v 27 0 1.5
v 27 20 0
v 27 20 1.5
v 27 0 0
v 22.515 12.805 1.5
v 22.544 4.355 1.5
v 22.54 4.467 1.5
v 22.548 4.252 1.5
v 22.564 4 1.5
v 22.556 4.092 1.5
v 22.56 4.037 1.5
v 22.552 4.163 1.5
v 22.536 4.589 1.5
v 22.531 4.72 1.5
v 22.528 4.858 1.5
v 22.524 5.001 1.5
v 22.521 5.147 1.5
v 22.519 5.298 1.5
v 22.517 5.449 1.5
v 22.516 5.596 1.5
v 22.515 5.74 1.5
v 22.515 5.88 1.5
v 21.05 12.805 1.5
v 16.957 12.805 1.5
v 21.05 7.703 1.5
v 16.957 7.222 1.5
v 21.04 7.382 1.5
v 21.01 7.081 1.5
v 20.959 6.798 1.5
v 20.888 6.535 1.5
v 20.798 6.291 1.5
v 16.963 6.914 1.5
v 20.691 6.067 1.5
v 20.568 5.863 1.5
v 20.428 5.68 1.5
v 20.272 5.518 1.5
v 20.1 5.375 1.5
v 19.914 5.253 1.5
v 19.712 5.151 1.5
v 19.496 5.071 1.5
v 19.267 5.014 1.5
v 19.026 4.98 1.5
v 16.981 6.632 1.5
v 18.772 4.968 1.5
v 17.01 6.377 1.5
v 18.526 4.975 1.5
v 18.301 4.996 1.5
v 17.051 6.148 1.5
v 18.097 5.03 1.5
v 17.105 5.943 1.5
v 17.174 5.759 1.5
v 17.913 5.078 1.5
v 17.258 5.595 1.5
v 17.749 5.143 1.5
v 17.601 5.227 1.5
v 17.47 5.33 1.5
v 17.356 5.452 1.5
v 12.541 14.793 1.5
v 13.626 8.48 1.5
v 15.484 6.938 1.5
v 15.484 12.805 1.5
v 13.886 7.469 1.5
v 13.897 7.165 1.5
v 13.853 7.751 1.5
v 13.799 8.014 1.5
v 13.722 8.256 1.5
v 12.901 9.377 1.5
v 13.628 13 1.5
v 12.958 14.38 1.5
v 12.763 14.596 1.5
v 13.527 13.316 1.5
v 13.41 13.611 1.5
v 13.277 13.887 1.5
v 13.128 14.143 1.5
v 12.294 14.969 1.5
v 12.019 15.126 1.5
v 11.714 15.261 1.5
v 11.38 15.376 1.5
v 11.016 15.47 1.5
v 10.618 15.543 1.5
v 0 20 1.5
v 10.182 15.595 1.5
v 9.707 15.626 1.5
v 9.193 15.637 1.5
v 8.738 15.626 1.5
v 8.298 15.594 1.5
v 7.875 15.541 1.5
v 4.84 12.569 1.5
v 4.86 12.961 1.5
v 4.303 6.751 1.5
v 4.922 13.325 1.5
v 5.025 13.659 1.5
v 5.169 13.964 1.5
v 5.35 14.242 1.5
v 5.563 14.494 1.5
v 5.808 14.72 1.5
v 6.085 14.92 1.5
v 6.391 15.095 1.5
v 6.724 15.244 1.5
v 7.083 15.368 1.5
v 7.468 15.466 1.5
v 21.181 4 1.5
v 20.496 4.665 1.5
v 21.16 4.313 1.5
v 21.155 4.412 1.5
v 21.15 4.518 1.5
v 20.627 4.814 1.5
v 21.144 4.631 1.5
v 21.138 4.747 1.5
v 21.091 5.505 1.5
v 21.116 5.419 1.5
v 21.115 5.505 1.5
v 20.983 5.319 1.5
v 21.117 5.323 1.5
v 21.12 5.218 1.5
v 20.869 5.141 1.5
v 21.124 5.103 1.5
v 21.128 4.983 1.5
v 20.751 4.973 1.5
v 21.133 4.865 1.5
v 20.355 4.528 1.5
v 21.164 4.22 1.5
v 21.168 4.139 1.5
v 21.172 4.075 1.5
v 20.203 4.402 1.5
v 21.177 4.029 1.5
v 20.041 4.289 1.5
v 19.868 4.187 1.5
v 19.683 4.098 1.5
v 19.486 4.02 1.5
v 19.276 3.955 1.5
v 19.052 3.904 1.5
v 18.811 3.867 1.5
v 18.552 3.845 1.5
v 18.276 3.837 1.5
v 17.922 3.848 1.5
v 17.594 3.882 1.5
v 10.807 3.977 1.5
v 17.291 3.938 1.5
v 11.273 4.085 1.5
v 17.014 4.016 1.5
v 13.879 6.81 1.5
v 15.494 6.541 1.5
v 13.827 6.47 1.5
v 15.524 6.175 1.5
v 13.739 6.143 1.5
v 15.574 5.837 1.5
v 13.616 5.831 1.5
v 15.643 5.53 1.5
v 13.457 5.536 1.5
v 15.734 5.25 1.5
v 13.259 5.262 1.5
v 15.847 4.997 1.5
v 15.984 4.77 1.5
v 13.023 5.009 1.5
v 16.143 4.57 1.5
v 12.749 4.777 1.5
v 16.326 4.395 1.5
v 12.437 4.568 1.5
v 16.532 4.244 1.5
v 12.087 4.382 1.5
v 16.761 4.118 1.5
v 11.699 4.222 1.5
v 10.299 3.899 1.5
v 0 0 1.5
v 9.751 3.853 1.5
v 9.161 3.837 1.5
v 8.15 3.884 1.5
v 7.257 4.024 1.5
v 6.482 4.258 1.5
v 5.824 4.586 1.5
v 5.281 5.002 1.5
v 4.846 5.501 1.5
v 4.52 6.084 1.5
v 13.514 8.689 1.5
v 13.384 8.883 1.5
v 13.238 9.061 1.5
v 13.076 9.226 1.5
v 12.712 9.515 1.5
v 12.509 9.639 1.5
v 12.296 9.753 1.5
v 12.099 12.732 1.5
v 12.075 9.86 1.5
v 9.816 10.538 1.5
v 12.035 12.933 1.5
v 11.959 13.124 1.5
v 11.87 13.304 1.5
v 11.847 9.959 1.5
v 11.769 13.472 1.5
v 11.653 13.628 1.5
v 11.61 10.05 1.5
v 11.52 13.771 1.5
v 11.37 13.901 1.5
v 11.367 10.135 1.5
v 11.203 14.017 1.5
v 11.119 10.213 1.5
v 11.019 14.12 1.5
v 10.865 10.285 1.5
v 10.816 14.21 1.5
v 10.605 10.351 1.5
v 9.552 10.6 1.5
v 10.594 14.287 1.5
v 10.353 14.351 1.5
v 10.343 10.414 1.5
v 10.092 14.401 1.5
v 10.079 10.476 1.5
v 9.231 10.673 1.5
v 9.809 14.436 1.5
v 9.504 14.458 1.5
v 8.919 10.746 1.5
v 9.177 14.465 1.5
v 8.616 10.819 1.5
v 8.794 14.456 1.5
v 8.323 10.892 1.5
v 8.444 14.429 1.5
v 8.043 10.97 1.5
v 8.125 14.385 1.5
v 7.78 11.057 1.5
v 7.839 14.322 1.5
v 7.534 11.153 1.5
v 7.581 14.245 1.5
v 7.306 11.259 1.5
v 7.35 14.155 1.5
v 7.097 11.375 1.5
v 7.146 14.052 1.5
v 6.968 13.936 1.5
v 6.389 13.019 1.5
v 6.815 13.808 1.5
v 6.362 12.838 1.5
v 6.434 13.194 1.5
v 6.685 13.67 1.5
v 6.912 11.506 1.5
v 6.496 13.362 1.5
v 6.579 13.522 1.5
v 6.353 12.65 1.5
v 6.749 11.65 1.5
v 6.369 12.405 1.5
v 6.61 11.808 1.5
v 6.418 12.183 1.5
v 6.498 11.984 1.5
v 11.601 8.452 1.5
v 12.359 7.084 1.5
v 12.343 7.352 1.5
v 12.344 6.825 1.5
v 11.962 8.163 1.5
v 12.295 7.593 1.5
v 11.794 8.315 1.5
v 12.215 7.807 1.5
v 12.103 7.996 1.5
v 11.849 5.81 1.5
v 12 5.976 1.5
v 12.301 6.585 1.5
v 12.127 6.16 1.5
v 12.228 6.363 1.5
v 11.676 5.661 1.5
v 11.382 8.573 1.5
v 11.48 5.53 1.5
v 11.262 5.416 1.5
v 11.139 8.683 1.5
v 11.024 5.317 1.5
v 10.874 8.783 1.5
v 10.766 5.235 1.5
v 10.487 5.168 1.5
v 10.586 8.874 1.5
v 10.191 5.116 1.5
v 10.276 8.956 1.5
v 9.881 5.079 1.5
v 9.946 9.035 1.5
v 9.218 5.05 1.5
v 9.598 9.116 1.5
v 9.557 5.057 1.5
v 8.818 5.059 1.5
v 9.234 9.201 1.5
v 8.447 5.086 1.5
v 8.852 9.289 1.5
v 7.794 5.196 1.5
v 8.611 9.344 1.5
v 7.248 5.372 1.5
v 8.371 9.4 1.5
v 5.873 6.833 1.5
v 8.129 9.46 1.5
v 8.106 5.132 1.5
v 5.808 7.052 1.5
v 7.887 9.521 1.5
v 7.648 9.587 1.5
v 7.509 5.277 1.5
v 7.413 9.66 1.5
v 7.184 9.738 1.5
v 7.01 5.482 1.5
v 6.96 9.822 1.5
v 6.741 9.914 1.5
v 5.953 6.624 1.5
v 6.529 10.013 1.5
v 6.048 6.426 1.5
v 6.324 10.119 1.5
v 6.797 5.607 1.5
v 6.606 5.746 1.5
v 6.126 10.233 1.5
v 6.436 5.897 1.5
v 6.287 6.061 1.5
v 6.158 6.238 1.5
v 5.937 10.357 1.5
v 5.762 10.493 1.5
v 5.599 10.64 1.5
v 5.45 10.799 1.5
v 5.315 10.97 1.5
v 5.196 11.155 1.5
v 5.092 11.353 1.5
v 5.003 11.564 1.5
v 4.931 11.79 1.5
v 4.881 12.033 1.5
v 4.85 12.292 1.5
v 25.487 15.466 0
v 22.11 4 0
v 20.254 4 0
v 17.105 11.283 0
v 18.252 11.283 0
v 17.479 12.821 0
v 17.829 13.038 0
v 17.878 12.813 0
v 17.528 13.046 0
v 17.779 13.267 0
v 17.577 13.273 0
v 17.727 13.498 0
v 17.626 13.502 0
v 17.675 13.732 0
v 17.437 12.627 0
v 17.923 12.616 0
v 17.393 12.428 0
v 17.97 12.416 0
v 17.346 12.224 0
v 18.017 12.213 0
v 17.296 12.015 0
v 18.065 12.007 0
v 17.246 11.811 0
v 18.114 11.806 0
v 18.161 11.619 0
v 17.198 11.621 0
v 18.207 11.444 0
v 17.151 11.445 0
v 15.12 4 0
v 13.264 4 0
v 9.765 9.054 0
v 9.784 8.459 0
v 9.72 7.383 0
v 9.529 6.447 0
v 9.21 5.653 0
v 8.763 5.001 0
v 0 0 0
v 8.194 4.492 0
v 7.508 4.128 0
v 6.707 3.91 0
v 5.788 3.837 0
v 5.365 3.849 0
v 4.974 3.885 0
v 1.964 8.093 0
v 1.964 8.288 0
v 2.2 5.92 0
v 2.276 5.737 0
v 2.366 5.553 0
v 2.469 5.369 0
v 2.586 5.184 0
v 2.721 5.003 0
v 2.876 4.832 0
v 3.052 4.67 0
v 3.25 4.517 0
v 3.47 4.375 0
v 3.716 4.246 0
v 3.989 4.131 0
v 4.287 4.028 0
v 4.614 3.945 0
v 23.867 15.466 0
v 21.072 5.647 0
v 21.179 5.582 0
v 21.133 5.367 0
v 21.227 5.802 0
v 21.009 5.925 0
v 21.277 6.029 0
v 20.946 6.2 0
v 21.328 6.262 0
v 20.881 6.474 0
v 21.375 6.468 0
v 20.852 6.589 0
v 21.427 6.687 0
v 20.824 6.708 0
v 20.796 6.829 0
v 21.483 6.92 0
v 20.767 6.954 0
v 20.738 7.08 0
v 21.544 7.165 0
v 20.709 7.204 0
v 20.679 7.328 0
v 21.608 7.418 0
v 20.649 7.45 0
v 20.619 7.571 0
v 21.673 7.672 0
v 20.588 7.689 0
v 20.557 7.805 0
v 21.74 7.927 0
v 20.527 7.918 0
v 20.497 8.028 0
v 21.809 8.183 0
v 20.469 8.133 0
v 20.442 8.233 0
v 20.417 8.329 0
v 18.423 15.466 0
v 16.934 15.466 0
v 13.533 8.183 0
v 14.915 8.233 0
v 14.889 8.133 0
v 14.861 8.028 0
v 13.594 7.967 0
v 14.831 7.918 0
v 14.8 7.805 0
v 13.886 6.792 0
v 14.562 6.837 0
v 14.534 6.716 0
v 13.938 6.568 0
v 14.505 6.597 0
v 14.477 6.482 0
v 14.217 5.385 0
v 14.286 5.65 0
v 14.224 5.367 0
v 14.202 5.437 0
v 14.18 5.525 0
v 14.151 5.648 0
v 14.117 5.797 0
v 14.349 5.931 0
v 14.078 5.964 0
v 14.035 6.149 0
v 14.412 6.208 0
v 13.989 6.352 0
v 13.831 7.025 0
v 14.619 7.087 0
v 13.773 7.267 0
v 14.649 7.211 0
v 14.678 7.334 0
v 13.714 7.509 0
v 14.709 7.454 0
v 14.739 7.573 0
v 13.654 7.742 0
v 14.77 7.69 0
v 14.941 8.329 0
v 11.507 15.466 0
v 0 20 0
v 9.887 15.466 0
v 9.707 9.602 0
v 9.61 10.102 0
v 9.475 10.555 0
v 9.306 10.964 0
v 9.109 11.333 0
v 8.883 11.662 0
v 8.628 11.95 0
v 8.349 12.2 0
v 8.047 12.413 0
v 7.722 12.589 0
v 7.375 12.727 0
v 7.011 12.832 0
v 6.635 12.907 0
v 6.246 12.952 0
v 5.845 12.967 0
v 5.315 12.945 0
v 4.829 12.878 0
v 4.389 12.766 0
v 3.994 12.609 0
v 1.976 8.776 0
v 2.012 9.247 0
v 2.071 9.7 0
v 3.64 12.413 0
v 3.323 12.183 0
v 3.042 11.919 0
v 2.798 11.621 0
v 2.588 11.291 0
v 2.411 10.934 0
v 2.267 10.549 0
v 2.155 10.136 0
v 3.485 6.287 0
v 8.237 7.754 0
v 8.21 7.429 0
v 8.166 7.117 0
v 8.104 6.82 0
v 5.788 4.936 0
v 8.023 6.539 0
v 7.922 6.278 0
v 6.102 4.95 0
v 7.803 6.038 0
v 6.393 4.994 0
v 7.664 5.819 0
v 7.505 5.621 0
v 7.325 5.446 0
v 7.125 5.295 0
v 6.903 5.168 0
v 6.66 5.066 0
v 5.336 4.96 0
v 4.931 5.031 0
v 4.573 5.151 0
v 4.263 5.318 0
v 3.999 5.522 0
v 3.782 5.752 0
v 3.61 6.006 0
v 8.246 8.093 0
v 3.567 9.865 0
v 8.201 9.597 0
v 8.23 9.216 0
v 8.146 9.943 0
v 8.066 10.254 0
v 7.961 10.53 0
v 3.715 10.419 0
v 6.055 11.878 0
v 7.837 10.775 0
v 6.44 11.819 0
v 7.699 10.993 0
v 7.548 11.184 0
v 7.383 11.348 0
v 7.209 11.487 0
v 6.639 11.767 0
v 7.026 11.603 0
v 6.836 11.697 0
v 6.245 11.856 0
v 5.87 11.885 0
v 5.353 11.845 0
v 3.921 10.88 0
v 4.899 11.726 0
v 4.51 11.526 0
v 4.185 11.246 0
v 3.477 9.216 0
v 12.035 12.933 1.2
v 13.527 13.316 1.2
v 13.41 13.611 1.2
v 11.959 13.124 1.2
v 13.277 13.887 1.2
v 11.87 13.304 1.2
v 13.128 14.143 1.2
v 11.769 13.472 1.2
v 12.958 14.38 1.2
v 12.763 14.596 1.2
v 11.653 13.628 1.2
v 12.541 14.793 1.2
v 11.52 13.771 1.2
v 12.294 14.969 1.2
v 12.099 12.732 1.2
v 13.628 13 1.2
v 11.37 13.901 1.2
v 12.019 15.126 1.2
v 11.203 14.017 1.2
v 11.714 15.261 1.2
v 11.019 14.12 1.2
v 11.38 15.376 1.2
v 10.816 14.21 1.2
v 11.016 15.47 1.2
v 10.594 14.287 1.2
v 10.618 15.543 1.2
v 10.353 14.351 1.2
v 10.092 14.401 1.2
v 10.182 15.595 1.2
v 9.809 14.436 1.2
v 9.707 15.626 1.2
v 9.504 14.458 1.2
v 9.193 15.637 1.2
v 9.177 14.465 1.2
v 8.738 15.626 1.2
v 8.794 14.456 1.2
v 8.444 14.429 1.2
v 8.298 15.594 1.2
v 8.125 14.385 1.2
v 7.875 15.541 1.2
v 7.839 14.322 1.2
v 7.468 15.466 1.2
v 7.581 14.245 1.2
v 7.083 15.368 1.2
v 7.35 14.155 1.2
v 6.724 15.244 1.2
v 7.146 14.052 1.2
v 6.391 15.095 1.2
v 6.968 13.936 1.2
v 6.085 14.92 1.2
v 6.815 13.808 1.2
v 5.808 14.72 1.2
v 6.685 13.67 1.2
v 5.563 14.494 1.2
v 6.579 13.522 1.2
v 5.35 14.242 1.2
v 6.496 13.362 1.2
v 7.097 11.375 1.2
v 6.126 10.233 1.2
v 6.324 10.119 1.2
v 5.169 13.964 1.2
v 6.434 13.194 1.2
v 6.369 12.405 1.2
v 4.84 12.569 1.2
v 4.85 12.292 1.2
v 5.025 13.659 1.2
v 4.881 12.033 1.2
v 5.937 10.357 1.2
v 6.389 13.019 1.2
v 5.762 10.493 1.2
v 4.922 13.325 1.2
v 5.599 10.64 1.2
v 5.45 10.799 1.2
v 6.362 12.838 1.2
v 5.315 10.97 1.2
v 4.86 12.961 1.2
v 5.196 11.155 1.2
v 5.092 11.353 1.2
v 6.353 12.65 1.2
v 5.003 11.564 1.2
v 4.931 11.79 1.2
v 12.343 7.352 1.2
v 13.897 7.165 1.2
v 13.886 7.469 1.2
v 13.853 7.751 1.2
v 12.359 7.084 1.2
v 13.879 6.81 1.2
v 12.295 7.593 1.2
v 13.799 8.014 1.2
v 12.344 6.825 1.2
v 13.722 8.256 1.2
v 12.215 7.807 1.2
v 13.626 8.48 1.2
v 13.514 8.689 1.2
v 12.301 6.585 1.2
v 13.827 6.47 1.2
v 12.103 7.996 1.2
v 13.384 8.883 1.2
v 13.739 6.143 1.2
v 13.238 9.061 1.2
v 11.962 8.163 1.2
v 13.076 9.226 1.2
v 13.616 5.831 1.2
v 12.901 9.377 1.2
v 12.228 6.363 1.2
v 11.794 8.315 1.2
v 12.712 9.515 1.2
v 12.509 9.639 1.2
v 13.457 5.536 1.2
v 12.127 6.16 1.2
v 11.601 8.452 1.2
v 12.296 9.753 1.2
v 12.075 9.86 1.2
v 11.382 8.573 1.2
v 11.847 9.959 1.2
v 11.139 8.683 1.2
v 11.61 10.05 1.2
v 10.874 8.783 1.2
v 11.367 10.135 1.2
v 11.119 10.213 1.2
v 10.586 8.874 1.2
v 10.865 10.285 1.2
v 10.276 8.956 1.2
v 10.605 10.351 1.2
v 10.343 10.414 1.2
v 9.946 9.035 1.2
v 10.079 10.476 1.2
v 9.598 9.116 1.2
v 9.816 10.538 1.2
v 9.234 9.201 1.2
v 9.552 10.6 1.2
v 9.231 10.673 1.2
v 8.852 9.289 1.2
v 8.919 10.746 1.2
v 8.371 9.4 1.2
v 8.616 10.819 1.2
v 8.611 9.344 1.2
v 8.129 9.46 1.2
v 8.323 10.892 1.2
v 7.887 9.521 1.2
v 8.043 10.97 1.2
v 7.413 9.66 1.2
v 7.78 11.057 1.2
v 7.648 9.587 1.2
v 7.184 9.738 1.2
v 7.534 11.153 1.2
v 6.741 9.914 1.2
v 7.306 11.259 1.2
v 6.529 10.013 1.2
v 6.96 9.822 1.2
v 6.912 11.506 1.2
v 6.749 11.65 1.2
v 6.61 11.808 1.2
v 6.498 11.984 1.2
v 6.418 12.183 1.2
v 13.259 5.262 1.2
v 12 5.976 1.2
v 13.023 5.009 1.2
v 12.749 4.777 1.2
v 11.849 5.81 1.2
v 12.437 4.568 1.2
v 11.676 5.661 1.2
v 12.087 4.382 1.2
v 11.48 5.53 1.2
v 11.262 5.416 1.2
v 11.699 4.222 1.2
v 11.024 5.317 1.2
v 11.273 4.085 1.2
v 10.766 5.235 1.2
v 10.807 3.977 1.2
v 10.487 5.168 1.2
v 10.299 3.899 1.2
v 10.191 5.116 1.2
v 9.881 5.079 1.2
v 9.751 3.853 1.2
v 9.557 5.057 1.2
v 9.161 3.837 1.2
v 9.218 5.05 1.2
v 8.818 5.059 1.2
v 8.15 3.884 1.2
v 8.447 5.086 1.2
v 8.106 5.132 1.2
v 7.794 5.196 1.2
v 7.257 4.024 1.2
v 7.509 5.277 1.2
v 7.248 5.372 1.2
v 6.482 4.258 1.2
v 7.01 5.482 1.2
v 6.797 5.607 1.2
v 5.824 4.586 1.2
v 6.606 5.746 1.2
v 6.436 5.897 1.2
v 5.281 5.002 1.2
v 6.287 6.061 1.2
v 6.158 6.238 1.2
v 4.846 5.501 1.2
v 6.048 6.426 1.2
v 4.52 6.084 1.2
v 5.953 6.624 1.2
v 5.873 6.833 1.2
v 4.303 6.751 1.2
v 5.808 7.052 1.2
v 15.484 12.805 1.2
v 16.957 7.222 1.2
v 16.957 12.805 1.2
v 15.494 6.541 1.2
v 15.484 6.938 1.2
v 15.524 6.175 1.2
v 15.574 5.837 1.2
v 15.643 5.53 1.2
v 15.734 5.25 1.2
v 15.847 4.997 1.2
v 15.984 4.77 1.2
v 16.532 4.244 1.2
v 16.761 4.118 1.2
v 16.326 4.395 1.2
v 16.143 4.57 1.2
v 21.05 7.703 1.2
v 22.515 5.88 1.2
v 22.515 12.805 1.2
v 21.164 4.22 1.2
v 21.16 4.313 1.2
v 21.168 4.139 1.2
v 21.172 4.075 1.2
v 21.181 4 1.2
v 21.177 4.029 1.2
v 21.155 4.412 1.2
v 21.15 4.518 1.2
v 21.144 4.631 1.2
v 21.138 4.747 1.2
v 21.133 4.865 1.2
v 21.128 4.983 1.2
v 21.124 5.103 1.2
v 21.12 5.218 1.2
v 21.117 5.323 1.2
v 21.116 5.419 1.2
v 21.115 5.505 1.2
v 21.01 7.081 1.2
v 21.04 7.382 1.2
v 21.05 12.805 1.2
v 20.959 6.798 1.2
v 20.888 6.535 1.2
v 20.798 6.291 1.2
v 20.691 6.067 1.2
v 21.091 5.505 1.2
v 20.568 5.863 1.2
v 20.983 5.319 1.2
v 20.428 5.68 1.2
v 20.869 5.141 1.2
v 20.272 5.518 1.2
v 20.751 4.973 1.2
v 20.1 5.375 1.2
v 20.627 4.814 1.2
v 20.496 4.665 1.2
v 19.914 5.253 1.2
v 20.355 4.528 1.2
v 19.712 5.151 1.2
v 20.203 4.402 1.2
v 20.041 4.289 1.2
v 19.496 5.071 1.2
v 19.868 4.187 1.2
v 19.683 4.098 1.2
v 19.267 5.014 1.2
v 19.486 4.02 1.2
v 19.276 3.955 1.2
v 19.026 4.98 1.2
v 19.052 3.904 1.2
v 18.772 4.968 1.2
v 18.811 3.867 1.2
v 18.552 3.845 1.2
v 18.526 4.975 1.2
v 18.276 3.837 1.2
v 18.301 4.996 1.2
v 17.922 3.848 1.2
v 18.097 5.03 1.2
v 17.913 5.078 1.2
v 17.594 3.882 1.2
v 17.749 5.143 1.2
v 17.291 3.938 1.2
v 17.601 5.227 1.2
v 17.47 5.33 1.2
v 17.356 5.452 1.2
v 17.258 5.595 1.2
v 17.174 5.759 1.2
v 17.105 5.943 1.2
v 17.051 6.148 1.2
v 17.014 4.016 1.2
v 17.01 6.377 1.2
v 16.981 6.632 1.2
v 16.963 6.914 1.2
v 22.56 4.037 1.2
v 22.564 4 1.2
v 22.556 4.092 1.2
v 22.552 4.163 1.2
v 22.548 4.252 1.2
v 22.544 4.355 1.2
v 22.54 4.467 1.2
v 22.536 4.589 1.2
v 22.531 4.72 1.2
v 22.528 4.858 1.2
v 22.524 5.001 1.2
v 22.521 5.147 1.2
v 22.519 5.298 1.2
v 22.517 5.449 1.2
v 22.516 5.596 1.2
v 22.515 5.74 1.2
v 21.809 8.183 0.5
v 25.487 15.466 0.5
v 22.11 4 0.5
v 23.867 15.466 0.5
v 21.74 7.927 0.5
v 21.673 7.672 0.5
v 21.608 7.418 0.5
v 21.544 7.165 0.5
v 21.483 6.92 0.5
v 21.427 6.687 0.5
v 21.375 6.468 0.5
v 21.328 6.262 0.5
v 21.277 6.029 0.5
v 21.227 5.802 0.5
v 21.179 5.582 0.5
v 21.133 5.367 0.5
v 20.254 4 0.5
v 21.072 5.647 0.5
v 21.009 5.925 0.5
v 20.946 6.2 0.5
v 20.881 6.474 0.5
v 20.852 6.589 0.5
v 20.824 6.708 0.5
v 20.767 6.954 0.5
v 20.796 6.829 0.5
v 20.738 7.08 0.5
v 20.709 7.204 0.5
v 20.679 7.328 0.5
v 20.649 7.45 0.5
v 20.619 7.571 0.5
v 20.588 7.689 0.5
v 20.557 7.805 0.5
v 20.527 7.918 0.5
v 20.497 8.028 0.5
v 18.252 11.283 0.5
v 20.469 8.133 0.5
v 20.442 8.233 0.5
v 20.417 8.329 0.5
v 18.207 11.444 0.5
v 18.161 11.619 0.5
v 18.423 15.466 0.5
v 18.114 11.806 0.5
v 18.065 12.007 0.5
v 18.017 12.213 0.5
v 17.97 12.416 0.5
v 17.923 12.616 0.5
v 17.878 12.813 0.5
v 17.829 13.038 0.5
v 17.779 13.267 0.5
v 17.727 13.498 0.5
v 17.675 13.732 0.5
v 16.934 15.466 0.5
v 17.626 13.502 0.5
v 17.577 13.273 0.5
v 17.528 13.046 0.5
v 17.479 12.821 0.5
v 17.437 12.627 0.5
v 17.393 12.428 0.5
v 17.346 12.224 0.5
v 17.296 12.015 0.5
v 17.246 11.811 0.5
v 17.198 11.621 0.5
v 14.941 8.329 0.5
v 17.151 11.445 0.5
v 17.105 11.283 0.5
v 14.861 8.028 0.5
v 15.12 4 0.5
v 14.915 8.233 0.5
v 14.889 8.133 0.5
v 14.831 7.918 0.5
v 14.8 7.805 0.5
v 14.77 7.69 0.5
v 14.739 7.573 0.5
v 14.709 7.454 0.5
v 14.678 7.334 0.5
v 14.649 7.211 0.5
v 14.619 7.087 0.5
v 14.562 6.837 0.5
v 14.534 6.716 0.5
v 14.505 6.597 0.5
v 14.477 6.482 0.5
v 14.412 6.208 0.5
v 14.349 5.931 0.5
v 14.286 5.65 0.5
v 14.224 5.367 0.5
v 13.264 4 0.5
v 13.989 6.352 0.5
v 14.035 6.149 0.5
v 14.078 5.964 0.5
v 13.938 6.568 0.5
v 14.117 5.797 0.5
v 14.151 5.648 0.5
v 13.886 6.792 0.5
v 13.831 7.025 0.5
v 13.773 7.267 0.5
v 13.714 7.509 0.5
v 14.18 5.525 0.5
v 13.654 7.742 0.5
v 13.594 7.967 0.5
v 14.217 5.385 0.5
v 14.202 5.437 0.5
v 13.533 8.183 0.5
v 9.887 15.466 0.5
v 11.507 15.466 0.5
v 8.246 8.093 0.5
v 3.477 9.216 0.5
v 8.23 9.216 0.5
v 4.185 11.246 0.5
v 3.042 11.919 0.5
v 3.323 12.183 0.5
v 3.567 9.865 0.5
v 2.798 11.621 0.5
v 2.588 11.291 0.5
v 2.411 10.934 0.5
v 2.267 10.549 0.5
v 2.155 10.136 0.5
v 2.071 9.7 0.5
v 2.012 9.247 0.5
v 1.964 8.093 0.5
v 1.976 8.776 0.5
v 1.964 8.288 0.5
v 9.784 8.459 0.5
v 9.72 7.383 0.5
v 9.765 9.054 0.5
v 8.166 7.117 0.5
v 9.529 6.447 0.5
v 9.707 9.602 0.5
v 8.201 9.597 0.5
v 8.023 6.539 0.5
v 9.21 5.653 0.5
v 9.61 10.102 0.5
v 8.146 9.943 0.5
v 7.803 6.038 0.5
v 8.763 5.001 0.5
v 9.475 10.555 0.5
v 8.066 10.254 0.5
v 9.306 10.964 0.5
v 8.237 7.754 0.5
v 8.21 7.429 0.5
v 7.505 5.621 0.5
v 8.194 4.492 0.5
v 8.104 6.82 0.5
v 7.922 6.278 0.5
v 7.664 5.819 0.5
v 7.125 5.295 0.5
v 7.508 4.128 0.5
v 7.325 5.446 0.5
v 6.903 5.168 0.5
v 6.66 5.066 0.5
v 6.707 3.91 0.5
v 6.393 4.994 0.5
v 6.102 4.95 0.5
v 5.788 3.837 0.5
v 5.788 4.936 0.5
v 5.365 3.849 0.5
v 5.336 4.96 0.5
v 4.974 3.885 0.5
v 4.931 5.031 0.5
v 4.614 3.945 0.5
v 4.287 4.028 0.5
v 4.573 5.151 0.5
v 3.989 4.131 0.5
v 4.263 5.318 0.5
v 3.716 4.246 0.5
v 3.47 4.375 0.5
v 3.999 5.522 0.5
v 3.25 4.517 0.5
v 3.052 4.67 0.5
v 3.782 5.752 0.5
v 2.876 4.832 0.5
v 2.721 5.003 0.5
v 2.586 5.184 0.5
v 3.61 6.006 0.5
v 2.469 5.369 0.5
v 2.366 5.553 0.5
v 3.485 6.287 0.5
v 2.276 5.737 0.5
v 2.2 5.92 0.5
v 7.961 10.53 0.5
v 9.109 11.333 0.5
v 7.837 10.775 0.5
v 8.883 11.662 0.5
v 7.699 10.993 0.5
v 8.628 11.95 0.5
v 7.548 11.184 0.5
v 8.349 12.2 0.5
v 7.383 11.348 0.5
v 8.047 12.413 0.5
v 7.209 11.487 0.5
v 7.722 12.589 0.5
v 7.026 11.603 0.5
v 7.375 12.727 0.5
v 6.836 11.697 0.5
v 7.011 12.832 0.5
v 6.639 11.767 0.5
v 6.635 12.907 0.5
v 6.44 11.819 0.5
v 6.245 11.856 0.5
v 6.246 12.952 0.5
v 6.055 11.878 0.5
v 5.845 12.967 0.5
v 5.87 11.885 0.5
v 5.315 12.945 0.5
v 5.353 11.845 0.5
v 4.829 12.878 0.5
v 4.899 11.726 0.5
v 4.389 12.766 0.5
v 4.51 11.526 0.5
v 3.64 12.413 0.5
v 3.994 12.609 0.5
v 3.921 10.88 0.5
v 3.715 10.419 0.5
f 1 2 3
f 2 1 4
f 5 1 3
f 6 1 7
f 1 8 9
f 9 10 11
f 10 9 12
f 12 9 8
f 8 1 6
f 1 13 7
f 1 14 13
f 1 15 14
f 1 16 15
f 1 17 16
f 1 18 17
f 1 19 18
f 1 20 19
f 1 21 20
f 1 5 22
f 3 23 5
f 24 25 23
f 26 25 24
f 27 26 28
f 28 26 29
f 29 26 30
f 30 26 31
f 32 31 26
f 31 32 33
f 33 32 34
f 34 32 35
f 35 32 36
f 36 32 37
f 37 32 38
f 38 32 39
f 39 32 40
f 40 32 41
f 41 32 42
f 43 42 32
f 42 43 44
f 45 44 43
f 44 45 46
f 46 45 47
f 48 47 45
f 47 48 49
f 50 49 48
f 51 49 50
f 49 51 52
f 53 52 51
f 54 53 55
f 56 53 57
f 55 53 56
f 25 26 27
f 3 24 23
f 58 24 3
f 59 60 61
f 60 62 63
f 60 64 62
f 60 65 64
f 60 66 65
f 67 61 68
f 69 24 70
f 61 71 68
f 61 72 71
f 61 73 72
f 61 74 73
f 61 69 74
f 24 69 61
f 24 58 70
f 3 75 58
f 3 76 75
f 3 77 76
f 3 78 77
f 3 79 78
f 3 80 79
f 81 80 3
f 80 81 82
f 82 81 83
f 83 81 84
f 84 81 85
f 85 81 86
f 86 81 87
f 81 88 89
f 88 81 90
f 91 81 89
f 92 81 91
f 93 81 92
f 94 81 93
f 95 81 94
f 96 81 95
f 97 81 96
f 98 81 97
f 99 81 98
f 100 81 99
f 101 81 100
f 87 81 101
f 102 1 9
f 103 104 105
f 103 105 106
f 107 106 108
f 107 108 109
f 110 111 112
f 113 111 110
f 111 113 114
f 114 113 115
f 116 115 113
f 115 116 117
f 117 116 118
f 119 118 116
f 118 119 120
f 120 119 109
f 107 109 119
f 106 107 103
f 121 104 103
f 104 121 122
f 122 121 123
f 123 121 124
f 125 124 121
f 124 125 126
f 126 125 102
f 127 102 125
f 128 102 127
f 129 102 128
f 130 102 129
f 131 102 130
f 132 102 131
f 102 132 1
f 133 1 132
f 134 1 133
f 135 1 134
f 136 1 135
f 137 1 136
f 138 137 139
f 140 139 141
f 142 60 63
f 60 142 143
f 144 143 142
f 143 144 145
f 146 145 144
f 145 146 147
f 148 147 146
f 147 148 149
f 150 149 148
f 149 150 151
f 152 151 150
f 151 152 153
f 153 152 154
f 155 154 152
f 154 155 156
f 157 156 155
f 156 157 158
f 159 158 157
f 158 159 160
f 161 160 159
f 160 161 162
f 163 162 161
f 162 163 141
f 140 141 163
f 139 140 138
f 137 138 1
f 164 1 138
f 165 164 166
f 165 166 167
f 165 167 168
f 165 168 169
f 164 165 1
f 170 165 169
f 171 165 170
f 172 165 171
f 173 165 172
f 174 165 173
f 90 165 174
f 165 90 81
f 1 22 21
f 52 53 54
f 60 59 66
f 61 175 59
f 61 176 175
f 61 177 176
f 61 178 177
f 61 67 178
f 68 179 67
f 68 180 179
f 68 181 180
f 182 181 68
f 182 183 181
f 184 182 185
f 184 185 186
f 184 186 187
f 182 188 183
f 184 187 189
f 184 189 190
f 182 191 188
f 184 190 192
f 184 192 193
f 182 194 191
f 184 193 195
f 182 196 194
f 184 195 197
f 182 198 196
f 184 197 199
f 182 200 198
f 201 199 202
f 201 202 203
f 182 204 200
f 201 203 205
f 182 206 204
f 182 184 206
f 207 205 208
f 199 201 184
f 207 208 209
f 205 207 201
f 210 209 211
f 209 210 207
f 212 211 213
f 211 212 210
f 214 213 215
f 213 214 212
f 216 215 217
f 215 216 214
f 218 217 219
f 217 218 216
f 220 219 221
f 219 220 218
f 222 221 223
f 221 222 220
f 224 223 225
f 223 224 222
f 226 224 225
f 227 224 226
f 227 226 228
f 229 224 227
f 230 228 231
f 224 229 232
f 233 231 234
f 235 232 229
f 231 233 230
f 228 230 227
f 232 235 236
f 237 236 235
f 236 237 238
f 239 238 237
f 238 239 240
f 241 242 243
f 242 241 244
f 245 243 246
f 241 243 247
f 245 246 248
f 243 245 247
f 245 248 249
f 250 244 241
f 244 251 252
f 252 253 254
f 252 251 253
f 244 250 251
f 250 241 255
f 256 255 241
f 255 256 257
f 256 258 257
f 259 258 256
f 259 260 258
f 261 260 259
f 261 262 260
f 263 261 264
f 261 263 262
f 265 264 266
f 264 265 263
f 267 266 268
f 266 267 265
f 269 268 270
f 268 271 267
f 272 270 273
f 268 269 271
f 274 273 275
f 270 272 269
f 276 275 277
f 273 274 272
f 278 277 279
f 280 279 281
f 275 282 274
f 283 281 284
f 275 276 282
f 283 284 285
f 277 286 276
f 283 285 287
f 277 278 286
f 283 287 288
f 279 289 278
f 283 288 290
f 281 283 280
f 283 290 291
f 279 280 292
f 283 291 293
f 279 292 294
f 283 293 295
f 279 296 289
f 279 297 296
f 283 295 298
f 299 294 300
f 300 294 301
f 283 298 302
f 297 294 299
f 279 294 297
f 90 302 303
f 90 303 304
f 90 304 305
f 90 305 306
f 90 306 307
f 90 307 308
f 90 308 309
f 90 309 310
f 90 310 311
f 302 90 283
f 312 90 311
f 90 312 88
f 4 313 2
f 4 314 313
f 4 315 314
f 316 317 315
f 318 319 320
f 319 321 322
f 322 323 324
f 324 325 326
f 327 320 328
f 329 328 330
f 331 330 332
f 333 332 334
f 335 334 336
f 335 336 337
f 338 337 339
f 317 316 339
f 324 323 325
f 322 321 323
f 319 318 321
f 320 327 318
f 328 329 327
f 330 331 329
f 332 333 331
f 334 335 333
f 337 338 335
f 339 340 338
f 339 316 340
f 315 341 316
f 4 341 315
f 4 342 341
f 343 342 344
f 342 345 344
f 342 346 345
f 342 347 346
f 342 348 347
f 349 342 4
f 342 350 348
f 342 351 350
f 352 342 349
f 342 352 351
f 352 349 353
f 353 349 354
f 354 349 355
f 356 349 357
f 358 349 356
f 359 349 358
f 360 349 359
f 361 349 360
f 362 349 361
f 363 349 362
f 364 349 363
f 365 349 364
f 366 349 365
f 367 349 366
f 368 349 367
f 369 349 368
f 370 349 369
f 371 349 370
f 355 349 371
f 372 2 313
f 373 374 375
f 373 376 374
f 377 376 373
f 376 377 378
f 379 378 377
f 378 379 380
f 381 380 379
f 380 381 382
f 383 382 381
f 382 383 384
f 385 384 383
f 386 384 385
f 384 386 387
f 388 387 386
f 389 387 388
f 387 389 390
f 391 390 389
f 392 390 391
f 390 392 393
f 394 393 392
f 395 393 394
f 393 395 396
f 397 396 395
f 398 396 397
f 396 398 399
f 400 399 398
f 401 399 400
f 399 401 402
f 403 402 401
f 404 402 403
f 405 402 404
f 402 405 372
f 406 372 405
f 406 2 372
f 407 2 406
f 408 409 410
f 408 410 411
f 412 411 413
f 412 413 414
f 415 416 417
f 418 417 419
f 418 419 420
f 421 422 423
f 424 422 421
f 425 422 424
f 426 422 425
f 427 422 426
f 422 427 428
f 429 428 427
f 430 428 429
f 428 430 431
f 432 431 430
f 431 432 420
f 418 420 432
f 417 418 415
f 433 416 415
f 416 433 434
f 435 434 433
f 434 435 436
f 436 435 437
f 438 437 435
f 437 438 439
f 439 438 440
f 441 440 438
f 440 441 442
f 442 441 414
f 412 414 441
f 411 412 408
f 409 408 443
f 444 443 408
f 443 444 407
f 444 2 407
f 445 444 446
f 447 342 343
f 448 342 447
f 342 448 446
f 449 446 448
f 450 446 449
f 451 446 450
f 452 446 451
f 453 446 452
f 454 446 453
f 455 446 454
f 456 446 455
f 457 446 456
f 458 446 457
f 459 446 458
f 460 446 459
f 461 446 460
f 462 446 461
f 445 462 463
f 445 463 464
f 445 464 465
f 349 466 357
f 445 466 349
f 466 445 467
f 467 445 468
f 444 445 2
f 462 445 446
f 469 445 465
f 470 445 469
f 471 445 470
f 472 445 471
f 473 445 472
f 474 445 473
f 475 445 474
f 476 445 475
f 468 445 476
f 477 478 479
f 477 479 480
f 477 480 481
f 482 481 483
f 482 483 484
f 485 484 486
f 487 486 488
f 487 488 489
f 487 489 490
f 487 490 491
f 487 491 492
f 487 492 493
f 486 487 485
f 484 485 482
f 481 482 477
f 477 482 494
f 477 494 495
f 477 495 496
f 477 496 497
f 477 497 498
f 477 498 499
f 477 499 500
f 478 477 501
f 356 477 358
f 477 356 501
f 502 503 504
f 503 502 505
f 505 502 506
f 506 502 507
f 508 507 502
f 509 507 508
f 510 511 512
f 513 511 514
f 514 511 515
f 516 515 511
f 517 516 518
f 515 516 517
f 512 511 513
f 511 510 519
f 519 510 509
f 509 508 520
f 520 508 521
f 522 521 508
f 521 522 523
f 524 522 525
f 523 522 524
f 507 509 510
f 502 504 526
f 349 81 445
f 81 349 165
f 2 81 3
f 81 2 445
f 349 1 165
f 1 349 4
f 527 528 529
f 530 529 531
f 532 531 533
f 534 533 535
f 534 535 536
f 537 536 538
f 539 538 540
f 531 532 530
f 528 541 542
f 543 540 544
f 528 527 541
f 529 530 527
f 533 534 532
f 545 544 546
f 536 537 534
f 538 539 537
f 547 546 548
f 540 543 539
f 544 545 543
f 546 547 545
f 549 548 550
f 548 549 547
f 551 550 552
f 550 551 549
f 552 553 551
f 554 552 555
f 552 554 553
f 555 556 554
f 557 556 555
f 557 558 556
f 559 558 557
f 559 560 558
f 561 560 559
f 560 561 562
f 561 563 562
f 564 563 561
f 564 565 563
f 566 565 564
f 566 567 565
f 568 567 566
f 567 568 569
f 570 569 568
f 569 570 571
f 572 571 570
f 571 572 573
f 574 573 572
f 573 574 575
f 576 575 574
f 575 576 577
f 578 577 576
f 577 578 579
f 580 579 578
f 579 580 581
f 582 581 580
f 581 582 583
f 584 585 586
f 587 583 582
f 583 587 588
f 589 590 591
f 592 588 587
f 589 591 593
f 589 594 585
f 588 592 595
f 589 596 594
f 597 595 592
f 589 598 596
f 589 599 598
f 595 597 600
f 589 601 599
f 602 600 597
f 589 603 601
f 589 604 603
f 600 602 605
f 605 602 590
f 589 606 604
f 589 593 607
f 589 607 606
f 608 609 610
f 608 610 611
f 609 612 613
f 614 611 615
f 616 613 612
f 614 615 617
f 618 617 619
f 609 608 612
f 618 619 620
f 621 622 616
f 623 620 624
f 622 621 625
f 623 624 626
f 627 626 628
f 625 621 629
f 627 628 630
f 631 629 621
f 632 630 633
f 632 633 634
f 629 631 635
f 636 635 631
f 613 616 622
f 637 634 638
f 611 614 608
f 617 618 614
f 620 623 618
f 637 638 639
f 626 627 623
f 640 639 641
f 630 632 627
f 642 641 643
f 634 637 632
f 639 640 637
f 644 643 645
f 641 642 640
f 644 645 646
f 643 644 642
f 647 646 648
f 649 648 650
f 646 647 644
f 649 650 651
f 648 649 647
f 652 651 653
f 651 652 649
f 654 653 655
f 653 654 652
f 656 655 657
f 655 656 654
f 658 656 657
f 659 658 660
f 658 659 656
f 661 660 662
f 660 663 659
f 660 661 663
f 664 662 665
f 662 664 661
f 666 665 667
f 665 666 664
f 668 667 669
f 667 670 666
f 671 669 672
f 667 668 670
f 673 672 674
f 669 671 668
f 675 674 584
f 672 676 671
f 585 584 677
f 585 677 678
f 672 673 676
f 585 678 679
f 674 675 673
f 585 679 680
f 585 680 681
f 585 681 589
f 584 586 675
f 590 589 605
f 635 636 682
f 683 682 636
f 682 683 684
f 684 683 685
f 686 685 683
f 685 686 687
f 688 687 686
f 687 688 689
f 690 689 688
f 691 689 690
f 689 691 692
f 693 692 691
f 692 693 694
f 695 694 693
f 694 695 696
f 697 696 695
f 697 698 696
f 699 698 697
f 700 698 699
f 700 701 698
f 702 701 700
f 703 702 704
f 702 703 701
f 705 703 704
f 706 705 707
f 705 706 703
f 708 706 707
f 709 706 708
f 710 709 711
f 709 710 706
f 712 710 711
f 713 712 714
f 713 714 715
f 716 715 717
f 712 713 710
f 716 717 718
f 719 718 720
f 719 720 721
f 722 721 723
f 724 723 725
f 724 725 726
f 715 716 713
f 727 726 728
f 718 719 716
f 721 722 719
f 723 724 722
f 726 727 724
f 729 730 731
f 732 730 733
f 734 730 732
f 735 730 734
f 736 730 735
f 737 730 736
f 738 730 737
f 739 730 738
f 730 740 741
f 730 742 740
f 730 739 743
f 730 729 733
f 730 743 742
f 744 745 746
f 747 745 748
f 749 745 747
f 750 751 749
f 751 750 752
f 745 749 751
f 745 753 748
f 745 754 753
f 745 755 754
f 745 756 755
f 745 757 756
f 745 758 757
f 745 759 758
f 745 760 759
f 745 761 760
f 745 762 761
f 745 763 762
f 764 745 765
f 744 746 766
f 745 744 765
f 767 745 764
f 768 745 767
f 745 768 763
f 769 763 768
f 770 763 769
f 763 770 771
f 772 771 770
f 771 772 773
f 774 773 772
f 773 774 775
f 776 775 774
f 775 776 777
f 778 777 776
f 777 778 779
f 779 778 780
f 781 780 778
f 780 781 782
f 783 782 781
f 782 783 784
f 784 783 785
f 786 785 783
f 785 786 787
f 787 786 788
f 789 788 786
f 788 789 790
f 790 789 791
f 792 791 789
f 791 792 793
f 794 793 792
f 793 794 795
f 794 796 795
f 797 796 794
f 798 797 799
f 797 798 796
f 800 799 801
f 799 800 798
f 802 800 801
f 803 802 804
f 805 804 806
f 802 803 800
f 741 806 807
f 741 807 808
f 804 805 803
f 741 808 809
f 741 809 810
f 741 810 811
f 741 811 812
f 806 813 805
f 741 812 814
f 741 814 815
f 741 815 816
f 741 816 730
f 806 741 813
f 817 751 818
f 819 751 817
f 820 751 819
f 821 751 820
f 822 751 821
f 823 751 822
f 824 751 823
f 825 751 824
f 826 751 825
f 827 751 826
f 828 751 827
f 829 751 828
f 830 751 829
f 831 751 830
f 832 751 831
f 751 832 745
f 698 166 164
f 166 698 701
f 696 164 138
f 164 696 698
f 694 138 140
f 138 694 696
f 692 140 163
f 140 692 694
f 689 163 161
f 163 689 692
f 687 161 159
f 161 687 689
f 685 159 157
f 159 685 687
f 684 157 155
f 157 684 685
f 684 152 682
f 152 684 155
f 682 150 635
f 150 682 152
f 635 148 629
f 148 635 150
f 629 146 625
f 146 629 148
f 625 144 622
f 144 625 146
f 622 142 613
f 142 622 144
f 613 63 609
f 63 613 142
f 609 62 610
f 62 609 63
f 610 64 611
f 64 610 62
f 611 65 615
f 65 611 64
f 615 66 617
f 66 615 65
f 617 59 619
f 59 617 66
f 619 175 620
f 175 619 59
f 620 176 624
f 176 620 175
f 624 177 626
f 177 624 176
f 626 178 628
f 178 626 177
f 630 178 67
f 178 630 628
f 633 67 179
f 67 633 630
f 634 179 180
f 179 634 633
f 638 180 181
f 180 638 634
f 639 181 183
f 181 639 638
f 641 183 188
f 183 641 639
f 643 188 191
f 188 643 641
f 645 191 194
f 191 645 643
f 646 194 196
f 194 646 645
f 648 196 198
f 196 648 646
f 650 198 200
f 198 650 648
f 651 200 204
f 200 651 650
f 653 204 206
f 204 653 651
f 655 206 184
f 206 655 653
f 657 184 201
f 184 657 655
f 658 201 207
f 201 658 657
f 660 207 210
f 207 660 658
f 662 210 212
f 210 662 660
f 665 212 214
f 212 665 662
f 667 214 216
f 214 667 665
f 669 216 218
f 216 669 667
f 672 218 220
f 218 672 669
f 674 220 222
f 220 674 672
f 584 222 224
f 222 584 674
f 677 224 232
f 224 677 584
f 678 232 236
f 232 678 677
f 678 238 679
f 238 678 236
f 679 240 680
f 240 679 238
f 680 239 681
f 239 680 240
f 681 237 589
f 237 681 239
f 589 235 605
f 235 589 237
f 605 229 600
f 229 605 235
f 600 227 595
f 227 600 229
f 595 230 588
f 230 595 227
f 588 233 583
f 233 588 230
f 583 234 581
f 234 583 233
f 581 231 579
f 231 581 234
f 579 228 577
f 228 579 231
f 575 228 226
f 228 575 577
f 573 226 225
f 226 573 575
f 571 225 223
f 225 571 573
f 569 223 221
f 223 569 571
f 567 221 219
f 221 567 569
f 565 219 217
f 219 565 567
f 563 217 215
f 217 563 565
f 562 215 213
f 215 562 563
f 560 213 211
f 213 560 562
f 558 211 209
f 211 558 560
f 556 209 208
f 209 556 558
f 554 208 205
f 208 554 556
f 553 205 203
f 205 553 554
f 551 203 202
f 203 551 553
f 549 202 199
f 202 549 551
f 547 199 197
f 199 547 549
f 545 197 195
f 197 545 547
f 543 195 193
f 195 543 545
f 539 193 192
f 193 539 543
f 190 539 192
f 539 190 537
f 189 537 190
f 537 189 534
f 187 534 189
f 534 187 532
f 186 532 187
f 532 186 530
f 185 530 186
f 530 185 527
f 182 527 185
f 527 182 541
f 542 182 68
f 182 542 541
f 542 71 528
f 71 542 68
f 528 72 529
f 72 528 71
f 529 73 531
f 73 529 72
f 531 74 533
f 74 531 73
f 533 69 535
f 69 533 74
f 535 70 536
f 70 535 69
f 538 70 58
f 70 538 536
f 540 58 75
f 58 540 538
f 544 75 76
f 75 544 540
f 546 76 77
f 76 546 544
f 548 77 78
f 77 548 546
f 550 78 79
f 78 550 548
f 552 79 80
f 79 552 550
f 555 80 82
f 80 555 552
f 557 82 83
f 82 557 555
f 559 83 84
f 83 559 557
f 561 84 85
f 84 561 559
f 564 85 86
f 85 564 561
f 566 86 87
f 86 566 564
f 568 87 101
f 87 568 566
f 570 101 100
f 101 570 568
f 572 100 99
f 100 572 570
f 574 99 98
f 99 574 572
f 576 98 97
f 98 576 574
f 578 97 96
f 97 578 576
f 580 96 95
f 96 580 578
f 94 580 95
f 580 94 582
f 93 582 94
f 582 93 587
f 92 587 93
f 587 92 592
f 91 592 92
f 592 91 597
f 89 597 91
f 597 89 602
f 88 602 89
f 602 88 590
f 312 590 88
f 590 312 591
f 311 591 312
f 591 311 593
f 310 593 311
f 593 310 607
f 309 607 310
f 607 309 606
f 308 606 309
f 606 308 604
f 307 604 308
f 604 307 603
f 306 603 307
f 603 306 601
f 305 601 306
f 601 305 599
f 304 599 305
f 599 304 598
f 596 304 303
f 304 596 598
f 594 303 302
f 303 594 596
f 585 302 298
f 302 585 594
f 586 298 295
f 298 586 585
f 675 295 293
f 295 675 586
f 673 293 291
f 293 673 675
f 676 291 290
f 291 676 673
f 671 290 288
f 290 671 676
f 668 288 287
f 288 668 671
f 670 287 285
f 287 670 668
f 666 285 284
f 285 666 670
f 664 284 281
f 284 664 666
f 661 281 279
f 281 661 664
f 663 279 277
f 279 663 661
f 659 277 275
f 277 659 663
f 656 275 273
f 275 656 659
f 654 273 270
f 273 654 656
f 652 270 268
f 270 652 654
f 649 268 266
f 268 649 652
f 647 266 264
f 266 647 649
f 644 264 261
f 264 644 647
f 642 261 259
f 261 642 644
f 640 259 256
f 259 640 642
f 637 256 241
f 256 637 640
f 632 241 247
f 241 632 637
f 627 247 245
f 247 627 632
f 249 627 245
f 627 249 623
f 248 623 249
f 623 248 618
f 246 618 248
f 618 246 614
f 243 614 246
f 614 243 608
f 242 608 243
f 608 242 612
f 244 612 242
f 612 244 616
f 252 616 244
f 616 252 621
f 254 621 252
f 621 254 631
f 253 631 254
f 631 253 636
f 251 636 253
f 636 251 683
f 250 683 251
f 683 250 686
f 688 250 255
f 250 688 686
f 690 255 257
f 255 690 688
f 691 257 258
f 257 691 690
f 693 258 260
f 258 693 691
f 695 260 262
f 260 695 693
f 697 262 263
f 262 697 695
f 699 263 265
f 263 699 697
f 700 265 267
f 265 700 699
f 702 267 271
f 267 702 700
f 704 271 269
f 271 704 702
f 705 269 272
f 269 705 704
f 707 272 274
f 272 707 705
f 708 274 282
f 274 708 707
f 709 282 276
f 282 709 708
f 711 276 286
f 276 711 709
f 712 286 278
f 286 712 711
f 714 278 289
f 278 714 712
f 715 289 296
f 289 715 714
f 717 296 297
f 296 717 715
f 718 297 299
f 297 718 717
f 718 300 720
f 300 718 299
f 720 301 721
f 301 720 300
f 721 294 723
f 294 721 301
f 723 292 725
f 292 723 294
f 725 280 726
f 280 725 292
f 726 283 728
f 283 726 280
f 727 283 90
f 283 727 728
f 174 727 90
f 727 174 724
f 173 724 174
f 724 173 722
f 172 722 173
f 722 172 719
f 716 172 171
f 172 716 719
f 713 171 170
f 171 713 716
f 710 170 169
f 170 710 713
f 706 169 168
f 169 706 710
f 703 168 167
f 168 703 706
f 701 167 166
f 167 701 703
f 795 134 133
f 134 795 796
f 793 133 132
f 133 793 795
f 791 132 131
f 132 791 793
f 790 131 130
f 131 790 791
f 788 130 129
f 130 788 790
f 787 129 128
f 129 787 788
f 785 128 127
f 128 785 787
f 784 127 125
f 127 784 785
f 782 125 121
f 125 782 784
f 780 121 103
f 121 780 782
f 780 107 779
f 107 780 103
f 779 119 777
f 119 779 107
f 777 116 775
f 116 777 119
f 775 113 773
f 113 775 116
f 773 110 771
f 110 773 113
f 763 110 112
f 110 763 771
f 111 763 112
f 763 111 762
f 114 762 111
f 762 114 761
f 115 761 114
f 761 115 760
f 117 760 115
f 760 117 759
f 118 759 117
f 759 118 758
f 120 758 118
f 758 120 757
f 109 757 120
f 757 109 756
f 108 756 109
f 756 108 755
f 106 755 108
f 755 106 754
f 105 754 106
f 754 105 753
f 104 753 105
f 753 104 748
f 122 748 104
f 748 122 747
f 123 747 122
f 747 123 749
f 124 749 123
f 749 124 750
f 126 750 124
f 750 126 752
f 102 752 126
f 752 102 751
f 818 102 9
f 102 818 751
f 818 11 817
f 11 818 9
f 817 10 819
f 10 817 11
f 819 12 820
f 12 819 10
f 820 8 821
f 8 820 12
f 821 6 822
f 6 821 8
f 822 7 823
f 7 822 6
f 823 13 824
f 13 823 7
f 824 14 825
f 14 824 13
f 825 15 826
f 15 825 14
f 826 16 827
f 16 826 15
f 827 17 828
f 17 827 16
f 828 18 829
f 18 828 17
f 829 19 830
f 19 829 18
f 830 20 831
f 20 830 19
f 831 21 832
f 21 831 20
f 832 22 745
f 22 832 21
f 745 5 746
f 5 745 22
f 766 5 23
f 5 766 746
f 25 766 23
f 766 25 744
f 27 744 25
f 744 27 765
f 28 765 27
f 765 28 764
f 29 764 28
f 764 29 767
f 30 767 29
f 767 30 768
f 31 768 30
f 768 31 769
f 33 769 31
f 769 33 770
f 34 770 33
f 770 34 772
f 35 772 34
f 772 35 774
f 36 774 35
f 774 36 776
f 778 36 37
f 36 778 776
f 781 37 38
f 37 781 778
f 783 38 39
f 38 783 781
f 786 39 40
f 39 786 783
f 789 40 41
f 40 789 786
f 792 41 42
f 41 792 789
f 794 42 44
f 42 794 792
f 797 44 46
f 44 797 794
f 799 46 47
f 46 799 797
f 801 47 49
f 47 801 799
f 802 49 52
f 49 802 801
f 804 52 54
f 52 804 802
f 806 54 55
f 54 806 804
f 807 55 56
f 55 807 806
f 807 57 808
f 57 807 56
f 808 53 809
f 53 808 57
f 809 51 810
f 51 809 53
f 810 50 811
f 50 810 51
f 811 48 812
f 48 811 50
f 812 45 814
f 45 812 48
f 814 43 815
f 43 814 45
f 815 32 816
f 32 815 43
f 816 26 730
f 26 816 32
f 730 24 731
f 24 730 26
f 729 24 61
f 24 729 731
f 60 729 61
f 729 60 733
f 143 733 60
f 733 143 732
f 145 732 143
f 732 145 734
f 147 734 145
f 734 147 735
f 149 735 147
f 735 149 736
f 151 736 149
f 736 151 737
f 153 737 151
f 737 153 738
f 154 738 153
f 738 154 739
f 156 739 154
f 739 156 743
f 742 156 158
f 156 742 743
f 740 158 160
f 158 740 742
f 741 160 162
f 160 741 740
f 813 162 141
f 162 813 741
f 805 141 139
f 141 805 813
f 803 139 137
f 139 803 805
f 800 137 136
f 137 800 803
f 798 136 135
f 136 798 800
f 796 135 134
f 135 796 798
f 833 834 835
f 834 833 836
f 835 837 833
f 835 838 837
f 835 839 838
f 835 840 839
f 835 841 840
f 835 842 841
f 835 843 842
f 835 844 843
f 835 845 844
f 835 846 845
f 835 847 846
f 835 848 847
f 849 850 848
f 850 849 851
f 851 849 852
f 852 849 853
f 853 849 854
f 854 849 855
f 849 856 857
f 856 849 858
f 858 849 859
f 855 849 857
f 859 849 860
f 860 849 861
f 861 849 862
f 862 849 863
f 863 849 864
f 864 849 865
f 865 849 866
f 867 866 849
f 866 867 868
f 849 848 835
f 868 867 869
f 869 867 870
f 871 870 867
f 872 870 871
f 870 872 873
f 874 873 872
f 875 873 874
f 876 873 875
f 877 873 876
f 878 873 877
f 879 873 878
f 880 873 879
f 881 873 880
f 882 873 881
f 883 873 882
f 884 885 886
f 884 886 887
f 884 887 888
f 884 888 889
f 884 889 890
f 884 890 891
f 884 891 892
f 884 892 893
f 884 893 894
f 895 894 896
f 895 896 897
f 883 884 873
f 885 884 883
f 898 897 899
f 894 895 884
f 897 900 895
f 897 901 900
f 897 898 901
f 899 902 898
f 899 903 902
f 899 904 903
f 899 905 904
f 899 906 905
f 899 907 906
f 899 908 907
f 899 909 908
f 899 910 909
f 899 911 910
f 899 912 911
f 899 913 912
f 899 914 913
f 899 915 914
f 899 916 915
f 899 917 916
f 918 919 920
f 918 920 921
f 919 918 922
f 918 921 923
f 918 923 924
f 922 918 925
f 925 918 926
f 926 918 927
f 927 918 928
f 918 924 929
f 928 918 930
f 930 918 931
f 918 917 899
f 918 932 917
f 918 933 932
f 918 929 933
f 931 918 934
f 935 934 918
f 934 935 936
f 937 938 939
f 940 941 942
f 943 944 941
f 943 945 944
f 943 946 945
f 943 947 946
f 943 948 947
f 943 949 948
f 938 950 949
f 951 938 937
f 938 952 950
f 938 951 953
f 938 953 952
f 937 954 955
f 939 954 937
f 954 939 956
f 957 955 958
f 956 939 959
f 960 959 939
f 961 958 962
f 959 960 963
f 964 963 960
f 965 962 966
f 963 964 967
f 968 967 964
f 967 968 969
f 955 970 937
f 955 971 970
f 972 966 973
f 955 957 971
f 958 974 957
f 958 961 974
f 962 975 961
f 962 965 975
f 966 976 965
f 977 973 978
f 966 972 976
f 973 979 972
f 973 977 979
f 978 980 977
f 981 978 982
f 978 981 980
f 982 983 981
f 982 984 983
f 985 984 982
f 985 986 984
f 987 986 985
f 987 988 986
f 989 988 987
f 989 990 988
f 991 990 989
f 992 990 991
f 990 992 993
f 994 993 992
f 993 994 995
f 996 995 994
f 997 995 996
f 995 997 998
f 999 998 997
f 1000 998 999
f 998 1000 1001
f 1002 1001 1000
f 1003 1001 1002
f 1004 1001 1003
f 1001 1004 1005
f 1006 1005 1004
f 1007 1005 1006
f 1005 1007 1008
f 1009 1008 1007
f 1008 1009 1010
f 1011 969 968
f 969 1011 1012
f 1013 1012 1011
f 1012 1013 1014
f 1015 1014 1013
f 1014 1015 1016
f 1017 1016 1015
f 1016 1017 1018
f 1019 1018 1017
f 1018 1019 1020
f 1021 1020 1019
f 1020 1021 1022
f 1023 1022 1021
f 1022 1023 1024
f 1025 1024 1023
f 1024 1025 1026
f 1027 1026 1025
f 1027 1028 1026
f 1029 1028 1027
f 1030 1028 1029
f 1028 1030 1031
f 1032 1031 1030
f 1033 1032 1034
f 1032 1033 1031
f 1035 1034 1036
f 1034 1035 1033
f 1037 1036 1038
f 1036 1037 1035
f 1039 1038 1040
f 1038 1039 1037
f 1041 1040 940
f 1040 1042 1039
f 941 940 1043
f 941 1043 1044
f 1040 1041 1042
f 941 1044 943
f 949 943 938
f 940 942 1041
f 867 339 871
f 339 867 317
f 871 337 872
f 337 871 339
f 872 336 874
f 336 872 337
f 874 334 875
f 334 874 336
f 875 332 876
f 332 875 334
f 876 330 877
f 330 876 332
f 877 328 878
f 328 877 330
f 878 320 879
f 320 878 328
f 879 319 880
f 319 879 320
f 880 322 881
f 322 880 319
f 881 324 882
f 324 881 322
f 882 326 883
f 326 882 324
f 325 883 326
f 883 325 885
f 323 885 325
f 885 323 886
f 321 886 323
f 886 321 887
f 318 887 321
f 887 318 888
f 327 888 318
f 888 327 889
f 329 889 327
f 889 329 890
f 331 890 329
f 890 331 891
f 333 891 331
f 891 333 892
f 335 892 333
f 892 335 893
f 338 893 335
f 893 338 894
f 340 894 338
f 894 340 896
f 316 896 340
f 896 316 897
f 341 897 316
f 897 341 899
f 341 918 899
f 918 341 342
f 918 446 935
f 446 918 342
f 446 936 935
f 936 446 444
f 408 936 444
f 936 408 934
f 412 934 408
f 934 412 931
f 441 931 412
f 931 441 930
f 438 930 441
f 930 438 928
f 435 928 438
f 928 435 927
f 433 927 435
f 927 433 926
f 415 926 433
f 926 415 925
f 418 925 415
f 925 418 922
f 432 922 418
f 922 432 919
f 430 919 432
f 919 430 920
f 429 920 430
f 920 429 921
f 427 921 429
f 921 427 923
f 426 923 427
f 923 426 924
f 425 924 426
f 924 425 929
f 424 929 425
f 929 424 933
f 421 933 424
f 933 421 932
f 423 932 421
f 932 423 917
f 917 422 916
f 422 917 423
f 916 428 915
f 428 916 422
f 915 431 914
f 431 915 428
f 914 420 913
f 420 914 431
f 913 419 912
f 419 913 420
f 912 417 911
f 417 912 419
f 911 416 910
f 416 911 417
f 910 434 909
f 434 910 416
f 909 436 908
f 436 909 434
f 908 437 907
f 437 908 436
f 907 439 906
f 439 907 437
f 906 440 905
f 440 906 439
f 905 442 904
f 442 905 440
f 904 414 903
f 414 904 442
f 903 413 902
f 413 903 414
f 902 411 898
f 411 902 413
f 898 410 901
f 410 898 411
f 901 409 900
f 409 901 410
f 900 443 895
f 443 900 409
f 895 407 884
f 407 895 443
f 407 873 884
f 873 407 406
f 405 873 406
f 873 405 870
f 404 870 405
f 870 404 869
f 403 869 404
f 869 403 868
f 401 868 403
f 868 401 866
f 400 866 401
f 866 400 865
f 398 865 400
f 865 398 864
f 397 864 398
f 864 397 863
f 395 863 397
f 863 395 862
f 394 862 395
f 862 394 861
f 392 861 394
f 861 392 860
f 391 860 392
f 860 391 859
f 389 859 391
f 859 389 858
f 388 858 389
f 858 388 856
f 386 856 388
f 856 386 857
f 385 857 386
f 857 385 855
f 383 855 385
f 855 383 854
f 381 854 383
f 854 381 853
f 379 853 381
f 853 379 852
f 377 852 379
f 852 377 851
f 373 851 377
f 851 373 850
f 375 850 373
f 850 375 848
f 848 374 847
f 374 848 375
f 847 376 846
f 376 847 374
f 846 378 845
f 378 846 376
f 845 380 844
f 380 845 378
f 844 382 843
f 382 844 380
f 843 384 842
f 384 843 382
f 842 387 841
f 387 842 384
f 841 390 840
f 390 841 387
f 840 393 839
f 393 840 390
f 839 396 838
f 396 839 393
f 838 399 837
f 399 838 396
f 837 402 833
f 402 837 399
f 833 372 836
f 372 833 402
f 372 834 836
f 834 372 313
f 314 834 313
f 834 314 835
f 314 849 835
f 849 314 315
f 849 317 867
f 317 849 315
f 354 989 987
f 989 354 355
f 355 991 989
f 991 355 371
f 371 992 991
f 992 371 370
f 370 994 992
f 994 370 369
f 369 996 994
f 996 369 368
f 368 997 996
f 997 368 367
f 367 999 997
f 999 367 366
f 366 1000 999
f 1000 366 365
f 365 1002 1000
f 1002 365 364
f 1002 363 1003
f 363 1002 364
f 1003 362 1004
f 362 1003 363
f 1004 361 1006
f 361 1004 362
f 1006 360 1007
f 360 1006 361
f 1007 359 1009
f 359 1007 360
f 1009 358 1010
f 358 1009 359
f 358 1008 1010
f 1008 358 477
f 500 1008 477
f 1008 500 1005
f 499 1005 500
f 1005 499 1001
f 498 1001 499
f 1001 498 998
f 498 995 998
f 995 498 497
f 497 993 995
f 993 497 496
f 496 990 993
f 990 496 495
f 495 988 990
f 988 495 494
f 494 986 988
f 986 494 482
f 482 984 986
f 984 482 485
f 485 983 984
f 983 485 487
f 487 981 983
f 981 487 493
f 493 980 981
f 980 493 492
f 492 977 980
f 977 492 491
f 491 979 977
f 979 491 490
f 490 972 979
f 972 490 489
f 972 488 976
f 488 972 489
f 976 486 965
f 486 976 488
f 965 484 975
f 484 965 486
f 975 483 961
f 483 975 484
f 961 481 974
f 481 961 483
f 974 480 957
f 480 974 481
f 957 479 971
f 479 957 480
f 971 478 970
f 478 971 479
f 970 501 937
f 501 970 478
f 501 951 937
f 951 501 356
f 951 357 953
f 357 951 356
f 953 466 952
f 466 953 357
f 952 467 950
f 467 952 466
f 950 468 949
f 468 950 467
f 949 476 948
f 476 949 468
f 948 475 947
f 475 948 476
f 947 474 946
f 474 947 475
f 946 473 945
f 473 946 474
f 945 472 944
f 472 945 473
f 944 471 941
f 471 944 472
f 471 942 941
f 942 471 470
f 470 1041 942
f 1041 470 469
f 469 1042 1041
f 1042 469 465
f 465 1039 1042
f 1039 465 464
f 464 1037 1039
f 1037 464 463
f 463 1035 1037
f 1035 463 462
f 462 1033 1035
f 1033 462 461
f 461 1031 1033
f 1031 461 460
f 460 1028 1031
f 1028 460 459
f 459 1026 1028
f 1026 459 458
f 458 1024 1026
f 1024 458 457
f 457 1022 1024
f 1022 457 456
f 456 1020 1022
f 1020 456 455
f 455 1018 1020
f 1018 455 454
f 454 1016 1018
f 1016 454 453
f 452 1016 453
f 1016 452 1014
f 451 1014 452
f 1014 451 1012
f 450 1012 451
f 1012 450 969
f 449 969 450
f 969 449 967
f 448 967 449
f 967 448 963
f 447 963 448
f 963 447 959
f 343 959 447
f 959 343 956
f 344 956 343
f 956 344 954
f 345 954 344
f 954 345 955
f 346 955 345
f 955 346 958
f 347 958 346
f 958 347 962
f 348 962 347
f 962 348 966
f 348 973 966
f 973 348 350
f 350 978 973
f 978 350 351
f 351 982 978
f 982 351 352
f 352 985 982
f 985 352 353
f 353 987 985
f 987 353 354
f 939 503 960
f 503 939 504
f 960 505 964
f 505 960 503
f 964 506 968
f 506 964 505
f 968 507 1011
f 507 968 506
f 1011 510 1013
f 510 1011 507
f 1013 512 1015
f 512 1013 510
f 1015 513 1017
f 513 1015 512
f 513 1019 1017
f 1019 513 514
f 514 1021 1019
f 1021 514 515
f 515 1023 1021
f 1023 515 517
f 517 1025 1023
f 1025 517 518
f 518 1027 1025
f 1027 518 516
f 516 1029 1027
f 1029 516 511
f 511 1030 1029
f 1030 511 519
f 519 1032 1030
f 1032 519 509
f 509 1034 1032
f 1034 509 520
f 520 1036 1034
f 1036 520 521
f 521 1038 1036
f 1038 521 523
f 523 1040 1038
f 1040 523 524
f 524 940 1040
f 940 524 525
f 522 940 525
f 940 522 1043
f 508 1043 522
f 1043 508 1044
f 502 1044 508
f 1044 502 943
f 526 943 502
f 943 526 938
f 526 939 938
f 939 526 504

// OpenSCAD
$fn=30;

//Masse (nicht zu knapp!):
//Mass, not too short
x=27; //Laenge
y=20; //Breite
z=1.5;  //Hoehe - 1.5 dürfte das Minimum sein
f="Arial";
s=12;  //Size
text1="Su";
text2="We";

difference() {
    //Aussenkoerper
    cube([x,y,z],false);
    translate([x/2,(y-s)/2,4*(z/5)]) {
        cube([1,1,0],false); //nur Ausrichtung
        linear_extrude(height = z) {
        text(text1,font=f,s,halign="center");
        }
    }
    //die Berechnung stimmt nicht so ganz... aber irgendwie passts schon
    translate([x/2,(y-s)/2,-(z/3)*2]) {
        cube([1,1,0],false); //nur Ausrichtung
        mirror([1, 0, 0]) {
            linear_extrude(height = z) {
                text(text2,font=f,s,halign="center");
            }
        }
    }
}
